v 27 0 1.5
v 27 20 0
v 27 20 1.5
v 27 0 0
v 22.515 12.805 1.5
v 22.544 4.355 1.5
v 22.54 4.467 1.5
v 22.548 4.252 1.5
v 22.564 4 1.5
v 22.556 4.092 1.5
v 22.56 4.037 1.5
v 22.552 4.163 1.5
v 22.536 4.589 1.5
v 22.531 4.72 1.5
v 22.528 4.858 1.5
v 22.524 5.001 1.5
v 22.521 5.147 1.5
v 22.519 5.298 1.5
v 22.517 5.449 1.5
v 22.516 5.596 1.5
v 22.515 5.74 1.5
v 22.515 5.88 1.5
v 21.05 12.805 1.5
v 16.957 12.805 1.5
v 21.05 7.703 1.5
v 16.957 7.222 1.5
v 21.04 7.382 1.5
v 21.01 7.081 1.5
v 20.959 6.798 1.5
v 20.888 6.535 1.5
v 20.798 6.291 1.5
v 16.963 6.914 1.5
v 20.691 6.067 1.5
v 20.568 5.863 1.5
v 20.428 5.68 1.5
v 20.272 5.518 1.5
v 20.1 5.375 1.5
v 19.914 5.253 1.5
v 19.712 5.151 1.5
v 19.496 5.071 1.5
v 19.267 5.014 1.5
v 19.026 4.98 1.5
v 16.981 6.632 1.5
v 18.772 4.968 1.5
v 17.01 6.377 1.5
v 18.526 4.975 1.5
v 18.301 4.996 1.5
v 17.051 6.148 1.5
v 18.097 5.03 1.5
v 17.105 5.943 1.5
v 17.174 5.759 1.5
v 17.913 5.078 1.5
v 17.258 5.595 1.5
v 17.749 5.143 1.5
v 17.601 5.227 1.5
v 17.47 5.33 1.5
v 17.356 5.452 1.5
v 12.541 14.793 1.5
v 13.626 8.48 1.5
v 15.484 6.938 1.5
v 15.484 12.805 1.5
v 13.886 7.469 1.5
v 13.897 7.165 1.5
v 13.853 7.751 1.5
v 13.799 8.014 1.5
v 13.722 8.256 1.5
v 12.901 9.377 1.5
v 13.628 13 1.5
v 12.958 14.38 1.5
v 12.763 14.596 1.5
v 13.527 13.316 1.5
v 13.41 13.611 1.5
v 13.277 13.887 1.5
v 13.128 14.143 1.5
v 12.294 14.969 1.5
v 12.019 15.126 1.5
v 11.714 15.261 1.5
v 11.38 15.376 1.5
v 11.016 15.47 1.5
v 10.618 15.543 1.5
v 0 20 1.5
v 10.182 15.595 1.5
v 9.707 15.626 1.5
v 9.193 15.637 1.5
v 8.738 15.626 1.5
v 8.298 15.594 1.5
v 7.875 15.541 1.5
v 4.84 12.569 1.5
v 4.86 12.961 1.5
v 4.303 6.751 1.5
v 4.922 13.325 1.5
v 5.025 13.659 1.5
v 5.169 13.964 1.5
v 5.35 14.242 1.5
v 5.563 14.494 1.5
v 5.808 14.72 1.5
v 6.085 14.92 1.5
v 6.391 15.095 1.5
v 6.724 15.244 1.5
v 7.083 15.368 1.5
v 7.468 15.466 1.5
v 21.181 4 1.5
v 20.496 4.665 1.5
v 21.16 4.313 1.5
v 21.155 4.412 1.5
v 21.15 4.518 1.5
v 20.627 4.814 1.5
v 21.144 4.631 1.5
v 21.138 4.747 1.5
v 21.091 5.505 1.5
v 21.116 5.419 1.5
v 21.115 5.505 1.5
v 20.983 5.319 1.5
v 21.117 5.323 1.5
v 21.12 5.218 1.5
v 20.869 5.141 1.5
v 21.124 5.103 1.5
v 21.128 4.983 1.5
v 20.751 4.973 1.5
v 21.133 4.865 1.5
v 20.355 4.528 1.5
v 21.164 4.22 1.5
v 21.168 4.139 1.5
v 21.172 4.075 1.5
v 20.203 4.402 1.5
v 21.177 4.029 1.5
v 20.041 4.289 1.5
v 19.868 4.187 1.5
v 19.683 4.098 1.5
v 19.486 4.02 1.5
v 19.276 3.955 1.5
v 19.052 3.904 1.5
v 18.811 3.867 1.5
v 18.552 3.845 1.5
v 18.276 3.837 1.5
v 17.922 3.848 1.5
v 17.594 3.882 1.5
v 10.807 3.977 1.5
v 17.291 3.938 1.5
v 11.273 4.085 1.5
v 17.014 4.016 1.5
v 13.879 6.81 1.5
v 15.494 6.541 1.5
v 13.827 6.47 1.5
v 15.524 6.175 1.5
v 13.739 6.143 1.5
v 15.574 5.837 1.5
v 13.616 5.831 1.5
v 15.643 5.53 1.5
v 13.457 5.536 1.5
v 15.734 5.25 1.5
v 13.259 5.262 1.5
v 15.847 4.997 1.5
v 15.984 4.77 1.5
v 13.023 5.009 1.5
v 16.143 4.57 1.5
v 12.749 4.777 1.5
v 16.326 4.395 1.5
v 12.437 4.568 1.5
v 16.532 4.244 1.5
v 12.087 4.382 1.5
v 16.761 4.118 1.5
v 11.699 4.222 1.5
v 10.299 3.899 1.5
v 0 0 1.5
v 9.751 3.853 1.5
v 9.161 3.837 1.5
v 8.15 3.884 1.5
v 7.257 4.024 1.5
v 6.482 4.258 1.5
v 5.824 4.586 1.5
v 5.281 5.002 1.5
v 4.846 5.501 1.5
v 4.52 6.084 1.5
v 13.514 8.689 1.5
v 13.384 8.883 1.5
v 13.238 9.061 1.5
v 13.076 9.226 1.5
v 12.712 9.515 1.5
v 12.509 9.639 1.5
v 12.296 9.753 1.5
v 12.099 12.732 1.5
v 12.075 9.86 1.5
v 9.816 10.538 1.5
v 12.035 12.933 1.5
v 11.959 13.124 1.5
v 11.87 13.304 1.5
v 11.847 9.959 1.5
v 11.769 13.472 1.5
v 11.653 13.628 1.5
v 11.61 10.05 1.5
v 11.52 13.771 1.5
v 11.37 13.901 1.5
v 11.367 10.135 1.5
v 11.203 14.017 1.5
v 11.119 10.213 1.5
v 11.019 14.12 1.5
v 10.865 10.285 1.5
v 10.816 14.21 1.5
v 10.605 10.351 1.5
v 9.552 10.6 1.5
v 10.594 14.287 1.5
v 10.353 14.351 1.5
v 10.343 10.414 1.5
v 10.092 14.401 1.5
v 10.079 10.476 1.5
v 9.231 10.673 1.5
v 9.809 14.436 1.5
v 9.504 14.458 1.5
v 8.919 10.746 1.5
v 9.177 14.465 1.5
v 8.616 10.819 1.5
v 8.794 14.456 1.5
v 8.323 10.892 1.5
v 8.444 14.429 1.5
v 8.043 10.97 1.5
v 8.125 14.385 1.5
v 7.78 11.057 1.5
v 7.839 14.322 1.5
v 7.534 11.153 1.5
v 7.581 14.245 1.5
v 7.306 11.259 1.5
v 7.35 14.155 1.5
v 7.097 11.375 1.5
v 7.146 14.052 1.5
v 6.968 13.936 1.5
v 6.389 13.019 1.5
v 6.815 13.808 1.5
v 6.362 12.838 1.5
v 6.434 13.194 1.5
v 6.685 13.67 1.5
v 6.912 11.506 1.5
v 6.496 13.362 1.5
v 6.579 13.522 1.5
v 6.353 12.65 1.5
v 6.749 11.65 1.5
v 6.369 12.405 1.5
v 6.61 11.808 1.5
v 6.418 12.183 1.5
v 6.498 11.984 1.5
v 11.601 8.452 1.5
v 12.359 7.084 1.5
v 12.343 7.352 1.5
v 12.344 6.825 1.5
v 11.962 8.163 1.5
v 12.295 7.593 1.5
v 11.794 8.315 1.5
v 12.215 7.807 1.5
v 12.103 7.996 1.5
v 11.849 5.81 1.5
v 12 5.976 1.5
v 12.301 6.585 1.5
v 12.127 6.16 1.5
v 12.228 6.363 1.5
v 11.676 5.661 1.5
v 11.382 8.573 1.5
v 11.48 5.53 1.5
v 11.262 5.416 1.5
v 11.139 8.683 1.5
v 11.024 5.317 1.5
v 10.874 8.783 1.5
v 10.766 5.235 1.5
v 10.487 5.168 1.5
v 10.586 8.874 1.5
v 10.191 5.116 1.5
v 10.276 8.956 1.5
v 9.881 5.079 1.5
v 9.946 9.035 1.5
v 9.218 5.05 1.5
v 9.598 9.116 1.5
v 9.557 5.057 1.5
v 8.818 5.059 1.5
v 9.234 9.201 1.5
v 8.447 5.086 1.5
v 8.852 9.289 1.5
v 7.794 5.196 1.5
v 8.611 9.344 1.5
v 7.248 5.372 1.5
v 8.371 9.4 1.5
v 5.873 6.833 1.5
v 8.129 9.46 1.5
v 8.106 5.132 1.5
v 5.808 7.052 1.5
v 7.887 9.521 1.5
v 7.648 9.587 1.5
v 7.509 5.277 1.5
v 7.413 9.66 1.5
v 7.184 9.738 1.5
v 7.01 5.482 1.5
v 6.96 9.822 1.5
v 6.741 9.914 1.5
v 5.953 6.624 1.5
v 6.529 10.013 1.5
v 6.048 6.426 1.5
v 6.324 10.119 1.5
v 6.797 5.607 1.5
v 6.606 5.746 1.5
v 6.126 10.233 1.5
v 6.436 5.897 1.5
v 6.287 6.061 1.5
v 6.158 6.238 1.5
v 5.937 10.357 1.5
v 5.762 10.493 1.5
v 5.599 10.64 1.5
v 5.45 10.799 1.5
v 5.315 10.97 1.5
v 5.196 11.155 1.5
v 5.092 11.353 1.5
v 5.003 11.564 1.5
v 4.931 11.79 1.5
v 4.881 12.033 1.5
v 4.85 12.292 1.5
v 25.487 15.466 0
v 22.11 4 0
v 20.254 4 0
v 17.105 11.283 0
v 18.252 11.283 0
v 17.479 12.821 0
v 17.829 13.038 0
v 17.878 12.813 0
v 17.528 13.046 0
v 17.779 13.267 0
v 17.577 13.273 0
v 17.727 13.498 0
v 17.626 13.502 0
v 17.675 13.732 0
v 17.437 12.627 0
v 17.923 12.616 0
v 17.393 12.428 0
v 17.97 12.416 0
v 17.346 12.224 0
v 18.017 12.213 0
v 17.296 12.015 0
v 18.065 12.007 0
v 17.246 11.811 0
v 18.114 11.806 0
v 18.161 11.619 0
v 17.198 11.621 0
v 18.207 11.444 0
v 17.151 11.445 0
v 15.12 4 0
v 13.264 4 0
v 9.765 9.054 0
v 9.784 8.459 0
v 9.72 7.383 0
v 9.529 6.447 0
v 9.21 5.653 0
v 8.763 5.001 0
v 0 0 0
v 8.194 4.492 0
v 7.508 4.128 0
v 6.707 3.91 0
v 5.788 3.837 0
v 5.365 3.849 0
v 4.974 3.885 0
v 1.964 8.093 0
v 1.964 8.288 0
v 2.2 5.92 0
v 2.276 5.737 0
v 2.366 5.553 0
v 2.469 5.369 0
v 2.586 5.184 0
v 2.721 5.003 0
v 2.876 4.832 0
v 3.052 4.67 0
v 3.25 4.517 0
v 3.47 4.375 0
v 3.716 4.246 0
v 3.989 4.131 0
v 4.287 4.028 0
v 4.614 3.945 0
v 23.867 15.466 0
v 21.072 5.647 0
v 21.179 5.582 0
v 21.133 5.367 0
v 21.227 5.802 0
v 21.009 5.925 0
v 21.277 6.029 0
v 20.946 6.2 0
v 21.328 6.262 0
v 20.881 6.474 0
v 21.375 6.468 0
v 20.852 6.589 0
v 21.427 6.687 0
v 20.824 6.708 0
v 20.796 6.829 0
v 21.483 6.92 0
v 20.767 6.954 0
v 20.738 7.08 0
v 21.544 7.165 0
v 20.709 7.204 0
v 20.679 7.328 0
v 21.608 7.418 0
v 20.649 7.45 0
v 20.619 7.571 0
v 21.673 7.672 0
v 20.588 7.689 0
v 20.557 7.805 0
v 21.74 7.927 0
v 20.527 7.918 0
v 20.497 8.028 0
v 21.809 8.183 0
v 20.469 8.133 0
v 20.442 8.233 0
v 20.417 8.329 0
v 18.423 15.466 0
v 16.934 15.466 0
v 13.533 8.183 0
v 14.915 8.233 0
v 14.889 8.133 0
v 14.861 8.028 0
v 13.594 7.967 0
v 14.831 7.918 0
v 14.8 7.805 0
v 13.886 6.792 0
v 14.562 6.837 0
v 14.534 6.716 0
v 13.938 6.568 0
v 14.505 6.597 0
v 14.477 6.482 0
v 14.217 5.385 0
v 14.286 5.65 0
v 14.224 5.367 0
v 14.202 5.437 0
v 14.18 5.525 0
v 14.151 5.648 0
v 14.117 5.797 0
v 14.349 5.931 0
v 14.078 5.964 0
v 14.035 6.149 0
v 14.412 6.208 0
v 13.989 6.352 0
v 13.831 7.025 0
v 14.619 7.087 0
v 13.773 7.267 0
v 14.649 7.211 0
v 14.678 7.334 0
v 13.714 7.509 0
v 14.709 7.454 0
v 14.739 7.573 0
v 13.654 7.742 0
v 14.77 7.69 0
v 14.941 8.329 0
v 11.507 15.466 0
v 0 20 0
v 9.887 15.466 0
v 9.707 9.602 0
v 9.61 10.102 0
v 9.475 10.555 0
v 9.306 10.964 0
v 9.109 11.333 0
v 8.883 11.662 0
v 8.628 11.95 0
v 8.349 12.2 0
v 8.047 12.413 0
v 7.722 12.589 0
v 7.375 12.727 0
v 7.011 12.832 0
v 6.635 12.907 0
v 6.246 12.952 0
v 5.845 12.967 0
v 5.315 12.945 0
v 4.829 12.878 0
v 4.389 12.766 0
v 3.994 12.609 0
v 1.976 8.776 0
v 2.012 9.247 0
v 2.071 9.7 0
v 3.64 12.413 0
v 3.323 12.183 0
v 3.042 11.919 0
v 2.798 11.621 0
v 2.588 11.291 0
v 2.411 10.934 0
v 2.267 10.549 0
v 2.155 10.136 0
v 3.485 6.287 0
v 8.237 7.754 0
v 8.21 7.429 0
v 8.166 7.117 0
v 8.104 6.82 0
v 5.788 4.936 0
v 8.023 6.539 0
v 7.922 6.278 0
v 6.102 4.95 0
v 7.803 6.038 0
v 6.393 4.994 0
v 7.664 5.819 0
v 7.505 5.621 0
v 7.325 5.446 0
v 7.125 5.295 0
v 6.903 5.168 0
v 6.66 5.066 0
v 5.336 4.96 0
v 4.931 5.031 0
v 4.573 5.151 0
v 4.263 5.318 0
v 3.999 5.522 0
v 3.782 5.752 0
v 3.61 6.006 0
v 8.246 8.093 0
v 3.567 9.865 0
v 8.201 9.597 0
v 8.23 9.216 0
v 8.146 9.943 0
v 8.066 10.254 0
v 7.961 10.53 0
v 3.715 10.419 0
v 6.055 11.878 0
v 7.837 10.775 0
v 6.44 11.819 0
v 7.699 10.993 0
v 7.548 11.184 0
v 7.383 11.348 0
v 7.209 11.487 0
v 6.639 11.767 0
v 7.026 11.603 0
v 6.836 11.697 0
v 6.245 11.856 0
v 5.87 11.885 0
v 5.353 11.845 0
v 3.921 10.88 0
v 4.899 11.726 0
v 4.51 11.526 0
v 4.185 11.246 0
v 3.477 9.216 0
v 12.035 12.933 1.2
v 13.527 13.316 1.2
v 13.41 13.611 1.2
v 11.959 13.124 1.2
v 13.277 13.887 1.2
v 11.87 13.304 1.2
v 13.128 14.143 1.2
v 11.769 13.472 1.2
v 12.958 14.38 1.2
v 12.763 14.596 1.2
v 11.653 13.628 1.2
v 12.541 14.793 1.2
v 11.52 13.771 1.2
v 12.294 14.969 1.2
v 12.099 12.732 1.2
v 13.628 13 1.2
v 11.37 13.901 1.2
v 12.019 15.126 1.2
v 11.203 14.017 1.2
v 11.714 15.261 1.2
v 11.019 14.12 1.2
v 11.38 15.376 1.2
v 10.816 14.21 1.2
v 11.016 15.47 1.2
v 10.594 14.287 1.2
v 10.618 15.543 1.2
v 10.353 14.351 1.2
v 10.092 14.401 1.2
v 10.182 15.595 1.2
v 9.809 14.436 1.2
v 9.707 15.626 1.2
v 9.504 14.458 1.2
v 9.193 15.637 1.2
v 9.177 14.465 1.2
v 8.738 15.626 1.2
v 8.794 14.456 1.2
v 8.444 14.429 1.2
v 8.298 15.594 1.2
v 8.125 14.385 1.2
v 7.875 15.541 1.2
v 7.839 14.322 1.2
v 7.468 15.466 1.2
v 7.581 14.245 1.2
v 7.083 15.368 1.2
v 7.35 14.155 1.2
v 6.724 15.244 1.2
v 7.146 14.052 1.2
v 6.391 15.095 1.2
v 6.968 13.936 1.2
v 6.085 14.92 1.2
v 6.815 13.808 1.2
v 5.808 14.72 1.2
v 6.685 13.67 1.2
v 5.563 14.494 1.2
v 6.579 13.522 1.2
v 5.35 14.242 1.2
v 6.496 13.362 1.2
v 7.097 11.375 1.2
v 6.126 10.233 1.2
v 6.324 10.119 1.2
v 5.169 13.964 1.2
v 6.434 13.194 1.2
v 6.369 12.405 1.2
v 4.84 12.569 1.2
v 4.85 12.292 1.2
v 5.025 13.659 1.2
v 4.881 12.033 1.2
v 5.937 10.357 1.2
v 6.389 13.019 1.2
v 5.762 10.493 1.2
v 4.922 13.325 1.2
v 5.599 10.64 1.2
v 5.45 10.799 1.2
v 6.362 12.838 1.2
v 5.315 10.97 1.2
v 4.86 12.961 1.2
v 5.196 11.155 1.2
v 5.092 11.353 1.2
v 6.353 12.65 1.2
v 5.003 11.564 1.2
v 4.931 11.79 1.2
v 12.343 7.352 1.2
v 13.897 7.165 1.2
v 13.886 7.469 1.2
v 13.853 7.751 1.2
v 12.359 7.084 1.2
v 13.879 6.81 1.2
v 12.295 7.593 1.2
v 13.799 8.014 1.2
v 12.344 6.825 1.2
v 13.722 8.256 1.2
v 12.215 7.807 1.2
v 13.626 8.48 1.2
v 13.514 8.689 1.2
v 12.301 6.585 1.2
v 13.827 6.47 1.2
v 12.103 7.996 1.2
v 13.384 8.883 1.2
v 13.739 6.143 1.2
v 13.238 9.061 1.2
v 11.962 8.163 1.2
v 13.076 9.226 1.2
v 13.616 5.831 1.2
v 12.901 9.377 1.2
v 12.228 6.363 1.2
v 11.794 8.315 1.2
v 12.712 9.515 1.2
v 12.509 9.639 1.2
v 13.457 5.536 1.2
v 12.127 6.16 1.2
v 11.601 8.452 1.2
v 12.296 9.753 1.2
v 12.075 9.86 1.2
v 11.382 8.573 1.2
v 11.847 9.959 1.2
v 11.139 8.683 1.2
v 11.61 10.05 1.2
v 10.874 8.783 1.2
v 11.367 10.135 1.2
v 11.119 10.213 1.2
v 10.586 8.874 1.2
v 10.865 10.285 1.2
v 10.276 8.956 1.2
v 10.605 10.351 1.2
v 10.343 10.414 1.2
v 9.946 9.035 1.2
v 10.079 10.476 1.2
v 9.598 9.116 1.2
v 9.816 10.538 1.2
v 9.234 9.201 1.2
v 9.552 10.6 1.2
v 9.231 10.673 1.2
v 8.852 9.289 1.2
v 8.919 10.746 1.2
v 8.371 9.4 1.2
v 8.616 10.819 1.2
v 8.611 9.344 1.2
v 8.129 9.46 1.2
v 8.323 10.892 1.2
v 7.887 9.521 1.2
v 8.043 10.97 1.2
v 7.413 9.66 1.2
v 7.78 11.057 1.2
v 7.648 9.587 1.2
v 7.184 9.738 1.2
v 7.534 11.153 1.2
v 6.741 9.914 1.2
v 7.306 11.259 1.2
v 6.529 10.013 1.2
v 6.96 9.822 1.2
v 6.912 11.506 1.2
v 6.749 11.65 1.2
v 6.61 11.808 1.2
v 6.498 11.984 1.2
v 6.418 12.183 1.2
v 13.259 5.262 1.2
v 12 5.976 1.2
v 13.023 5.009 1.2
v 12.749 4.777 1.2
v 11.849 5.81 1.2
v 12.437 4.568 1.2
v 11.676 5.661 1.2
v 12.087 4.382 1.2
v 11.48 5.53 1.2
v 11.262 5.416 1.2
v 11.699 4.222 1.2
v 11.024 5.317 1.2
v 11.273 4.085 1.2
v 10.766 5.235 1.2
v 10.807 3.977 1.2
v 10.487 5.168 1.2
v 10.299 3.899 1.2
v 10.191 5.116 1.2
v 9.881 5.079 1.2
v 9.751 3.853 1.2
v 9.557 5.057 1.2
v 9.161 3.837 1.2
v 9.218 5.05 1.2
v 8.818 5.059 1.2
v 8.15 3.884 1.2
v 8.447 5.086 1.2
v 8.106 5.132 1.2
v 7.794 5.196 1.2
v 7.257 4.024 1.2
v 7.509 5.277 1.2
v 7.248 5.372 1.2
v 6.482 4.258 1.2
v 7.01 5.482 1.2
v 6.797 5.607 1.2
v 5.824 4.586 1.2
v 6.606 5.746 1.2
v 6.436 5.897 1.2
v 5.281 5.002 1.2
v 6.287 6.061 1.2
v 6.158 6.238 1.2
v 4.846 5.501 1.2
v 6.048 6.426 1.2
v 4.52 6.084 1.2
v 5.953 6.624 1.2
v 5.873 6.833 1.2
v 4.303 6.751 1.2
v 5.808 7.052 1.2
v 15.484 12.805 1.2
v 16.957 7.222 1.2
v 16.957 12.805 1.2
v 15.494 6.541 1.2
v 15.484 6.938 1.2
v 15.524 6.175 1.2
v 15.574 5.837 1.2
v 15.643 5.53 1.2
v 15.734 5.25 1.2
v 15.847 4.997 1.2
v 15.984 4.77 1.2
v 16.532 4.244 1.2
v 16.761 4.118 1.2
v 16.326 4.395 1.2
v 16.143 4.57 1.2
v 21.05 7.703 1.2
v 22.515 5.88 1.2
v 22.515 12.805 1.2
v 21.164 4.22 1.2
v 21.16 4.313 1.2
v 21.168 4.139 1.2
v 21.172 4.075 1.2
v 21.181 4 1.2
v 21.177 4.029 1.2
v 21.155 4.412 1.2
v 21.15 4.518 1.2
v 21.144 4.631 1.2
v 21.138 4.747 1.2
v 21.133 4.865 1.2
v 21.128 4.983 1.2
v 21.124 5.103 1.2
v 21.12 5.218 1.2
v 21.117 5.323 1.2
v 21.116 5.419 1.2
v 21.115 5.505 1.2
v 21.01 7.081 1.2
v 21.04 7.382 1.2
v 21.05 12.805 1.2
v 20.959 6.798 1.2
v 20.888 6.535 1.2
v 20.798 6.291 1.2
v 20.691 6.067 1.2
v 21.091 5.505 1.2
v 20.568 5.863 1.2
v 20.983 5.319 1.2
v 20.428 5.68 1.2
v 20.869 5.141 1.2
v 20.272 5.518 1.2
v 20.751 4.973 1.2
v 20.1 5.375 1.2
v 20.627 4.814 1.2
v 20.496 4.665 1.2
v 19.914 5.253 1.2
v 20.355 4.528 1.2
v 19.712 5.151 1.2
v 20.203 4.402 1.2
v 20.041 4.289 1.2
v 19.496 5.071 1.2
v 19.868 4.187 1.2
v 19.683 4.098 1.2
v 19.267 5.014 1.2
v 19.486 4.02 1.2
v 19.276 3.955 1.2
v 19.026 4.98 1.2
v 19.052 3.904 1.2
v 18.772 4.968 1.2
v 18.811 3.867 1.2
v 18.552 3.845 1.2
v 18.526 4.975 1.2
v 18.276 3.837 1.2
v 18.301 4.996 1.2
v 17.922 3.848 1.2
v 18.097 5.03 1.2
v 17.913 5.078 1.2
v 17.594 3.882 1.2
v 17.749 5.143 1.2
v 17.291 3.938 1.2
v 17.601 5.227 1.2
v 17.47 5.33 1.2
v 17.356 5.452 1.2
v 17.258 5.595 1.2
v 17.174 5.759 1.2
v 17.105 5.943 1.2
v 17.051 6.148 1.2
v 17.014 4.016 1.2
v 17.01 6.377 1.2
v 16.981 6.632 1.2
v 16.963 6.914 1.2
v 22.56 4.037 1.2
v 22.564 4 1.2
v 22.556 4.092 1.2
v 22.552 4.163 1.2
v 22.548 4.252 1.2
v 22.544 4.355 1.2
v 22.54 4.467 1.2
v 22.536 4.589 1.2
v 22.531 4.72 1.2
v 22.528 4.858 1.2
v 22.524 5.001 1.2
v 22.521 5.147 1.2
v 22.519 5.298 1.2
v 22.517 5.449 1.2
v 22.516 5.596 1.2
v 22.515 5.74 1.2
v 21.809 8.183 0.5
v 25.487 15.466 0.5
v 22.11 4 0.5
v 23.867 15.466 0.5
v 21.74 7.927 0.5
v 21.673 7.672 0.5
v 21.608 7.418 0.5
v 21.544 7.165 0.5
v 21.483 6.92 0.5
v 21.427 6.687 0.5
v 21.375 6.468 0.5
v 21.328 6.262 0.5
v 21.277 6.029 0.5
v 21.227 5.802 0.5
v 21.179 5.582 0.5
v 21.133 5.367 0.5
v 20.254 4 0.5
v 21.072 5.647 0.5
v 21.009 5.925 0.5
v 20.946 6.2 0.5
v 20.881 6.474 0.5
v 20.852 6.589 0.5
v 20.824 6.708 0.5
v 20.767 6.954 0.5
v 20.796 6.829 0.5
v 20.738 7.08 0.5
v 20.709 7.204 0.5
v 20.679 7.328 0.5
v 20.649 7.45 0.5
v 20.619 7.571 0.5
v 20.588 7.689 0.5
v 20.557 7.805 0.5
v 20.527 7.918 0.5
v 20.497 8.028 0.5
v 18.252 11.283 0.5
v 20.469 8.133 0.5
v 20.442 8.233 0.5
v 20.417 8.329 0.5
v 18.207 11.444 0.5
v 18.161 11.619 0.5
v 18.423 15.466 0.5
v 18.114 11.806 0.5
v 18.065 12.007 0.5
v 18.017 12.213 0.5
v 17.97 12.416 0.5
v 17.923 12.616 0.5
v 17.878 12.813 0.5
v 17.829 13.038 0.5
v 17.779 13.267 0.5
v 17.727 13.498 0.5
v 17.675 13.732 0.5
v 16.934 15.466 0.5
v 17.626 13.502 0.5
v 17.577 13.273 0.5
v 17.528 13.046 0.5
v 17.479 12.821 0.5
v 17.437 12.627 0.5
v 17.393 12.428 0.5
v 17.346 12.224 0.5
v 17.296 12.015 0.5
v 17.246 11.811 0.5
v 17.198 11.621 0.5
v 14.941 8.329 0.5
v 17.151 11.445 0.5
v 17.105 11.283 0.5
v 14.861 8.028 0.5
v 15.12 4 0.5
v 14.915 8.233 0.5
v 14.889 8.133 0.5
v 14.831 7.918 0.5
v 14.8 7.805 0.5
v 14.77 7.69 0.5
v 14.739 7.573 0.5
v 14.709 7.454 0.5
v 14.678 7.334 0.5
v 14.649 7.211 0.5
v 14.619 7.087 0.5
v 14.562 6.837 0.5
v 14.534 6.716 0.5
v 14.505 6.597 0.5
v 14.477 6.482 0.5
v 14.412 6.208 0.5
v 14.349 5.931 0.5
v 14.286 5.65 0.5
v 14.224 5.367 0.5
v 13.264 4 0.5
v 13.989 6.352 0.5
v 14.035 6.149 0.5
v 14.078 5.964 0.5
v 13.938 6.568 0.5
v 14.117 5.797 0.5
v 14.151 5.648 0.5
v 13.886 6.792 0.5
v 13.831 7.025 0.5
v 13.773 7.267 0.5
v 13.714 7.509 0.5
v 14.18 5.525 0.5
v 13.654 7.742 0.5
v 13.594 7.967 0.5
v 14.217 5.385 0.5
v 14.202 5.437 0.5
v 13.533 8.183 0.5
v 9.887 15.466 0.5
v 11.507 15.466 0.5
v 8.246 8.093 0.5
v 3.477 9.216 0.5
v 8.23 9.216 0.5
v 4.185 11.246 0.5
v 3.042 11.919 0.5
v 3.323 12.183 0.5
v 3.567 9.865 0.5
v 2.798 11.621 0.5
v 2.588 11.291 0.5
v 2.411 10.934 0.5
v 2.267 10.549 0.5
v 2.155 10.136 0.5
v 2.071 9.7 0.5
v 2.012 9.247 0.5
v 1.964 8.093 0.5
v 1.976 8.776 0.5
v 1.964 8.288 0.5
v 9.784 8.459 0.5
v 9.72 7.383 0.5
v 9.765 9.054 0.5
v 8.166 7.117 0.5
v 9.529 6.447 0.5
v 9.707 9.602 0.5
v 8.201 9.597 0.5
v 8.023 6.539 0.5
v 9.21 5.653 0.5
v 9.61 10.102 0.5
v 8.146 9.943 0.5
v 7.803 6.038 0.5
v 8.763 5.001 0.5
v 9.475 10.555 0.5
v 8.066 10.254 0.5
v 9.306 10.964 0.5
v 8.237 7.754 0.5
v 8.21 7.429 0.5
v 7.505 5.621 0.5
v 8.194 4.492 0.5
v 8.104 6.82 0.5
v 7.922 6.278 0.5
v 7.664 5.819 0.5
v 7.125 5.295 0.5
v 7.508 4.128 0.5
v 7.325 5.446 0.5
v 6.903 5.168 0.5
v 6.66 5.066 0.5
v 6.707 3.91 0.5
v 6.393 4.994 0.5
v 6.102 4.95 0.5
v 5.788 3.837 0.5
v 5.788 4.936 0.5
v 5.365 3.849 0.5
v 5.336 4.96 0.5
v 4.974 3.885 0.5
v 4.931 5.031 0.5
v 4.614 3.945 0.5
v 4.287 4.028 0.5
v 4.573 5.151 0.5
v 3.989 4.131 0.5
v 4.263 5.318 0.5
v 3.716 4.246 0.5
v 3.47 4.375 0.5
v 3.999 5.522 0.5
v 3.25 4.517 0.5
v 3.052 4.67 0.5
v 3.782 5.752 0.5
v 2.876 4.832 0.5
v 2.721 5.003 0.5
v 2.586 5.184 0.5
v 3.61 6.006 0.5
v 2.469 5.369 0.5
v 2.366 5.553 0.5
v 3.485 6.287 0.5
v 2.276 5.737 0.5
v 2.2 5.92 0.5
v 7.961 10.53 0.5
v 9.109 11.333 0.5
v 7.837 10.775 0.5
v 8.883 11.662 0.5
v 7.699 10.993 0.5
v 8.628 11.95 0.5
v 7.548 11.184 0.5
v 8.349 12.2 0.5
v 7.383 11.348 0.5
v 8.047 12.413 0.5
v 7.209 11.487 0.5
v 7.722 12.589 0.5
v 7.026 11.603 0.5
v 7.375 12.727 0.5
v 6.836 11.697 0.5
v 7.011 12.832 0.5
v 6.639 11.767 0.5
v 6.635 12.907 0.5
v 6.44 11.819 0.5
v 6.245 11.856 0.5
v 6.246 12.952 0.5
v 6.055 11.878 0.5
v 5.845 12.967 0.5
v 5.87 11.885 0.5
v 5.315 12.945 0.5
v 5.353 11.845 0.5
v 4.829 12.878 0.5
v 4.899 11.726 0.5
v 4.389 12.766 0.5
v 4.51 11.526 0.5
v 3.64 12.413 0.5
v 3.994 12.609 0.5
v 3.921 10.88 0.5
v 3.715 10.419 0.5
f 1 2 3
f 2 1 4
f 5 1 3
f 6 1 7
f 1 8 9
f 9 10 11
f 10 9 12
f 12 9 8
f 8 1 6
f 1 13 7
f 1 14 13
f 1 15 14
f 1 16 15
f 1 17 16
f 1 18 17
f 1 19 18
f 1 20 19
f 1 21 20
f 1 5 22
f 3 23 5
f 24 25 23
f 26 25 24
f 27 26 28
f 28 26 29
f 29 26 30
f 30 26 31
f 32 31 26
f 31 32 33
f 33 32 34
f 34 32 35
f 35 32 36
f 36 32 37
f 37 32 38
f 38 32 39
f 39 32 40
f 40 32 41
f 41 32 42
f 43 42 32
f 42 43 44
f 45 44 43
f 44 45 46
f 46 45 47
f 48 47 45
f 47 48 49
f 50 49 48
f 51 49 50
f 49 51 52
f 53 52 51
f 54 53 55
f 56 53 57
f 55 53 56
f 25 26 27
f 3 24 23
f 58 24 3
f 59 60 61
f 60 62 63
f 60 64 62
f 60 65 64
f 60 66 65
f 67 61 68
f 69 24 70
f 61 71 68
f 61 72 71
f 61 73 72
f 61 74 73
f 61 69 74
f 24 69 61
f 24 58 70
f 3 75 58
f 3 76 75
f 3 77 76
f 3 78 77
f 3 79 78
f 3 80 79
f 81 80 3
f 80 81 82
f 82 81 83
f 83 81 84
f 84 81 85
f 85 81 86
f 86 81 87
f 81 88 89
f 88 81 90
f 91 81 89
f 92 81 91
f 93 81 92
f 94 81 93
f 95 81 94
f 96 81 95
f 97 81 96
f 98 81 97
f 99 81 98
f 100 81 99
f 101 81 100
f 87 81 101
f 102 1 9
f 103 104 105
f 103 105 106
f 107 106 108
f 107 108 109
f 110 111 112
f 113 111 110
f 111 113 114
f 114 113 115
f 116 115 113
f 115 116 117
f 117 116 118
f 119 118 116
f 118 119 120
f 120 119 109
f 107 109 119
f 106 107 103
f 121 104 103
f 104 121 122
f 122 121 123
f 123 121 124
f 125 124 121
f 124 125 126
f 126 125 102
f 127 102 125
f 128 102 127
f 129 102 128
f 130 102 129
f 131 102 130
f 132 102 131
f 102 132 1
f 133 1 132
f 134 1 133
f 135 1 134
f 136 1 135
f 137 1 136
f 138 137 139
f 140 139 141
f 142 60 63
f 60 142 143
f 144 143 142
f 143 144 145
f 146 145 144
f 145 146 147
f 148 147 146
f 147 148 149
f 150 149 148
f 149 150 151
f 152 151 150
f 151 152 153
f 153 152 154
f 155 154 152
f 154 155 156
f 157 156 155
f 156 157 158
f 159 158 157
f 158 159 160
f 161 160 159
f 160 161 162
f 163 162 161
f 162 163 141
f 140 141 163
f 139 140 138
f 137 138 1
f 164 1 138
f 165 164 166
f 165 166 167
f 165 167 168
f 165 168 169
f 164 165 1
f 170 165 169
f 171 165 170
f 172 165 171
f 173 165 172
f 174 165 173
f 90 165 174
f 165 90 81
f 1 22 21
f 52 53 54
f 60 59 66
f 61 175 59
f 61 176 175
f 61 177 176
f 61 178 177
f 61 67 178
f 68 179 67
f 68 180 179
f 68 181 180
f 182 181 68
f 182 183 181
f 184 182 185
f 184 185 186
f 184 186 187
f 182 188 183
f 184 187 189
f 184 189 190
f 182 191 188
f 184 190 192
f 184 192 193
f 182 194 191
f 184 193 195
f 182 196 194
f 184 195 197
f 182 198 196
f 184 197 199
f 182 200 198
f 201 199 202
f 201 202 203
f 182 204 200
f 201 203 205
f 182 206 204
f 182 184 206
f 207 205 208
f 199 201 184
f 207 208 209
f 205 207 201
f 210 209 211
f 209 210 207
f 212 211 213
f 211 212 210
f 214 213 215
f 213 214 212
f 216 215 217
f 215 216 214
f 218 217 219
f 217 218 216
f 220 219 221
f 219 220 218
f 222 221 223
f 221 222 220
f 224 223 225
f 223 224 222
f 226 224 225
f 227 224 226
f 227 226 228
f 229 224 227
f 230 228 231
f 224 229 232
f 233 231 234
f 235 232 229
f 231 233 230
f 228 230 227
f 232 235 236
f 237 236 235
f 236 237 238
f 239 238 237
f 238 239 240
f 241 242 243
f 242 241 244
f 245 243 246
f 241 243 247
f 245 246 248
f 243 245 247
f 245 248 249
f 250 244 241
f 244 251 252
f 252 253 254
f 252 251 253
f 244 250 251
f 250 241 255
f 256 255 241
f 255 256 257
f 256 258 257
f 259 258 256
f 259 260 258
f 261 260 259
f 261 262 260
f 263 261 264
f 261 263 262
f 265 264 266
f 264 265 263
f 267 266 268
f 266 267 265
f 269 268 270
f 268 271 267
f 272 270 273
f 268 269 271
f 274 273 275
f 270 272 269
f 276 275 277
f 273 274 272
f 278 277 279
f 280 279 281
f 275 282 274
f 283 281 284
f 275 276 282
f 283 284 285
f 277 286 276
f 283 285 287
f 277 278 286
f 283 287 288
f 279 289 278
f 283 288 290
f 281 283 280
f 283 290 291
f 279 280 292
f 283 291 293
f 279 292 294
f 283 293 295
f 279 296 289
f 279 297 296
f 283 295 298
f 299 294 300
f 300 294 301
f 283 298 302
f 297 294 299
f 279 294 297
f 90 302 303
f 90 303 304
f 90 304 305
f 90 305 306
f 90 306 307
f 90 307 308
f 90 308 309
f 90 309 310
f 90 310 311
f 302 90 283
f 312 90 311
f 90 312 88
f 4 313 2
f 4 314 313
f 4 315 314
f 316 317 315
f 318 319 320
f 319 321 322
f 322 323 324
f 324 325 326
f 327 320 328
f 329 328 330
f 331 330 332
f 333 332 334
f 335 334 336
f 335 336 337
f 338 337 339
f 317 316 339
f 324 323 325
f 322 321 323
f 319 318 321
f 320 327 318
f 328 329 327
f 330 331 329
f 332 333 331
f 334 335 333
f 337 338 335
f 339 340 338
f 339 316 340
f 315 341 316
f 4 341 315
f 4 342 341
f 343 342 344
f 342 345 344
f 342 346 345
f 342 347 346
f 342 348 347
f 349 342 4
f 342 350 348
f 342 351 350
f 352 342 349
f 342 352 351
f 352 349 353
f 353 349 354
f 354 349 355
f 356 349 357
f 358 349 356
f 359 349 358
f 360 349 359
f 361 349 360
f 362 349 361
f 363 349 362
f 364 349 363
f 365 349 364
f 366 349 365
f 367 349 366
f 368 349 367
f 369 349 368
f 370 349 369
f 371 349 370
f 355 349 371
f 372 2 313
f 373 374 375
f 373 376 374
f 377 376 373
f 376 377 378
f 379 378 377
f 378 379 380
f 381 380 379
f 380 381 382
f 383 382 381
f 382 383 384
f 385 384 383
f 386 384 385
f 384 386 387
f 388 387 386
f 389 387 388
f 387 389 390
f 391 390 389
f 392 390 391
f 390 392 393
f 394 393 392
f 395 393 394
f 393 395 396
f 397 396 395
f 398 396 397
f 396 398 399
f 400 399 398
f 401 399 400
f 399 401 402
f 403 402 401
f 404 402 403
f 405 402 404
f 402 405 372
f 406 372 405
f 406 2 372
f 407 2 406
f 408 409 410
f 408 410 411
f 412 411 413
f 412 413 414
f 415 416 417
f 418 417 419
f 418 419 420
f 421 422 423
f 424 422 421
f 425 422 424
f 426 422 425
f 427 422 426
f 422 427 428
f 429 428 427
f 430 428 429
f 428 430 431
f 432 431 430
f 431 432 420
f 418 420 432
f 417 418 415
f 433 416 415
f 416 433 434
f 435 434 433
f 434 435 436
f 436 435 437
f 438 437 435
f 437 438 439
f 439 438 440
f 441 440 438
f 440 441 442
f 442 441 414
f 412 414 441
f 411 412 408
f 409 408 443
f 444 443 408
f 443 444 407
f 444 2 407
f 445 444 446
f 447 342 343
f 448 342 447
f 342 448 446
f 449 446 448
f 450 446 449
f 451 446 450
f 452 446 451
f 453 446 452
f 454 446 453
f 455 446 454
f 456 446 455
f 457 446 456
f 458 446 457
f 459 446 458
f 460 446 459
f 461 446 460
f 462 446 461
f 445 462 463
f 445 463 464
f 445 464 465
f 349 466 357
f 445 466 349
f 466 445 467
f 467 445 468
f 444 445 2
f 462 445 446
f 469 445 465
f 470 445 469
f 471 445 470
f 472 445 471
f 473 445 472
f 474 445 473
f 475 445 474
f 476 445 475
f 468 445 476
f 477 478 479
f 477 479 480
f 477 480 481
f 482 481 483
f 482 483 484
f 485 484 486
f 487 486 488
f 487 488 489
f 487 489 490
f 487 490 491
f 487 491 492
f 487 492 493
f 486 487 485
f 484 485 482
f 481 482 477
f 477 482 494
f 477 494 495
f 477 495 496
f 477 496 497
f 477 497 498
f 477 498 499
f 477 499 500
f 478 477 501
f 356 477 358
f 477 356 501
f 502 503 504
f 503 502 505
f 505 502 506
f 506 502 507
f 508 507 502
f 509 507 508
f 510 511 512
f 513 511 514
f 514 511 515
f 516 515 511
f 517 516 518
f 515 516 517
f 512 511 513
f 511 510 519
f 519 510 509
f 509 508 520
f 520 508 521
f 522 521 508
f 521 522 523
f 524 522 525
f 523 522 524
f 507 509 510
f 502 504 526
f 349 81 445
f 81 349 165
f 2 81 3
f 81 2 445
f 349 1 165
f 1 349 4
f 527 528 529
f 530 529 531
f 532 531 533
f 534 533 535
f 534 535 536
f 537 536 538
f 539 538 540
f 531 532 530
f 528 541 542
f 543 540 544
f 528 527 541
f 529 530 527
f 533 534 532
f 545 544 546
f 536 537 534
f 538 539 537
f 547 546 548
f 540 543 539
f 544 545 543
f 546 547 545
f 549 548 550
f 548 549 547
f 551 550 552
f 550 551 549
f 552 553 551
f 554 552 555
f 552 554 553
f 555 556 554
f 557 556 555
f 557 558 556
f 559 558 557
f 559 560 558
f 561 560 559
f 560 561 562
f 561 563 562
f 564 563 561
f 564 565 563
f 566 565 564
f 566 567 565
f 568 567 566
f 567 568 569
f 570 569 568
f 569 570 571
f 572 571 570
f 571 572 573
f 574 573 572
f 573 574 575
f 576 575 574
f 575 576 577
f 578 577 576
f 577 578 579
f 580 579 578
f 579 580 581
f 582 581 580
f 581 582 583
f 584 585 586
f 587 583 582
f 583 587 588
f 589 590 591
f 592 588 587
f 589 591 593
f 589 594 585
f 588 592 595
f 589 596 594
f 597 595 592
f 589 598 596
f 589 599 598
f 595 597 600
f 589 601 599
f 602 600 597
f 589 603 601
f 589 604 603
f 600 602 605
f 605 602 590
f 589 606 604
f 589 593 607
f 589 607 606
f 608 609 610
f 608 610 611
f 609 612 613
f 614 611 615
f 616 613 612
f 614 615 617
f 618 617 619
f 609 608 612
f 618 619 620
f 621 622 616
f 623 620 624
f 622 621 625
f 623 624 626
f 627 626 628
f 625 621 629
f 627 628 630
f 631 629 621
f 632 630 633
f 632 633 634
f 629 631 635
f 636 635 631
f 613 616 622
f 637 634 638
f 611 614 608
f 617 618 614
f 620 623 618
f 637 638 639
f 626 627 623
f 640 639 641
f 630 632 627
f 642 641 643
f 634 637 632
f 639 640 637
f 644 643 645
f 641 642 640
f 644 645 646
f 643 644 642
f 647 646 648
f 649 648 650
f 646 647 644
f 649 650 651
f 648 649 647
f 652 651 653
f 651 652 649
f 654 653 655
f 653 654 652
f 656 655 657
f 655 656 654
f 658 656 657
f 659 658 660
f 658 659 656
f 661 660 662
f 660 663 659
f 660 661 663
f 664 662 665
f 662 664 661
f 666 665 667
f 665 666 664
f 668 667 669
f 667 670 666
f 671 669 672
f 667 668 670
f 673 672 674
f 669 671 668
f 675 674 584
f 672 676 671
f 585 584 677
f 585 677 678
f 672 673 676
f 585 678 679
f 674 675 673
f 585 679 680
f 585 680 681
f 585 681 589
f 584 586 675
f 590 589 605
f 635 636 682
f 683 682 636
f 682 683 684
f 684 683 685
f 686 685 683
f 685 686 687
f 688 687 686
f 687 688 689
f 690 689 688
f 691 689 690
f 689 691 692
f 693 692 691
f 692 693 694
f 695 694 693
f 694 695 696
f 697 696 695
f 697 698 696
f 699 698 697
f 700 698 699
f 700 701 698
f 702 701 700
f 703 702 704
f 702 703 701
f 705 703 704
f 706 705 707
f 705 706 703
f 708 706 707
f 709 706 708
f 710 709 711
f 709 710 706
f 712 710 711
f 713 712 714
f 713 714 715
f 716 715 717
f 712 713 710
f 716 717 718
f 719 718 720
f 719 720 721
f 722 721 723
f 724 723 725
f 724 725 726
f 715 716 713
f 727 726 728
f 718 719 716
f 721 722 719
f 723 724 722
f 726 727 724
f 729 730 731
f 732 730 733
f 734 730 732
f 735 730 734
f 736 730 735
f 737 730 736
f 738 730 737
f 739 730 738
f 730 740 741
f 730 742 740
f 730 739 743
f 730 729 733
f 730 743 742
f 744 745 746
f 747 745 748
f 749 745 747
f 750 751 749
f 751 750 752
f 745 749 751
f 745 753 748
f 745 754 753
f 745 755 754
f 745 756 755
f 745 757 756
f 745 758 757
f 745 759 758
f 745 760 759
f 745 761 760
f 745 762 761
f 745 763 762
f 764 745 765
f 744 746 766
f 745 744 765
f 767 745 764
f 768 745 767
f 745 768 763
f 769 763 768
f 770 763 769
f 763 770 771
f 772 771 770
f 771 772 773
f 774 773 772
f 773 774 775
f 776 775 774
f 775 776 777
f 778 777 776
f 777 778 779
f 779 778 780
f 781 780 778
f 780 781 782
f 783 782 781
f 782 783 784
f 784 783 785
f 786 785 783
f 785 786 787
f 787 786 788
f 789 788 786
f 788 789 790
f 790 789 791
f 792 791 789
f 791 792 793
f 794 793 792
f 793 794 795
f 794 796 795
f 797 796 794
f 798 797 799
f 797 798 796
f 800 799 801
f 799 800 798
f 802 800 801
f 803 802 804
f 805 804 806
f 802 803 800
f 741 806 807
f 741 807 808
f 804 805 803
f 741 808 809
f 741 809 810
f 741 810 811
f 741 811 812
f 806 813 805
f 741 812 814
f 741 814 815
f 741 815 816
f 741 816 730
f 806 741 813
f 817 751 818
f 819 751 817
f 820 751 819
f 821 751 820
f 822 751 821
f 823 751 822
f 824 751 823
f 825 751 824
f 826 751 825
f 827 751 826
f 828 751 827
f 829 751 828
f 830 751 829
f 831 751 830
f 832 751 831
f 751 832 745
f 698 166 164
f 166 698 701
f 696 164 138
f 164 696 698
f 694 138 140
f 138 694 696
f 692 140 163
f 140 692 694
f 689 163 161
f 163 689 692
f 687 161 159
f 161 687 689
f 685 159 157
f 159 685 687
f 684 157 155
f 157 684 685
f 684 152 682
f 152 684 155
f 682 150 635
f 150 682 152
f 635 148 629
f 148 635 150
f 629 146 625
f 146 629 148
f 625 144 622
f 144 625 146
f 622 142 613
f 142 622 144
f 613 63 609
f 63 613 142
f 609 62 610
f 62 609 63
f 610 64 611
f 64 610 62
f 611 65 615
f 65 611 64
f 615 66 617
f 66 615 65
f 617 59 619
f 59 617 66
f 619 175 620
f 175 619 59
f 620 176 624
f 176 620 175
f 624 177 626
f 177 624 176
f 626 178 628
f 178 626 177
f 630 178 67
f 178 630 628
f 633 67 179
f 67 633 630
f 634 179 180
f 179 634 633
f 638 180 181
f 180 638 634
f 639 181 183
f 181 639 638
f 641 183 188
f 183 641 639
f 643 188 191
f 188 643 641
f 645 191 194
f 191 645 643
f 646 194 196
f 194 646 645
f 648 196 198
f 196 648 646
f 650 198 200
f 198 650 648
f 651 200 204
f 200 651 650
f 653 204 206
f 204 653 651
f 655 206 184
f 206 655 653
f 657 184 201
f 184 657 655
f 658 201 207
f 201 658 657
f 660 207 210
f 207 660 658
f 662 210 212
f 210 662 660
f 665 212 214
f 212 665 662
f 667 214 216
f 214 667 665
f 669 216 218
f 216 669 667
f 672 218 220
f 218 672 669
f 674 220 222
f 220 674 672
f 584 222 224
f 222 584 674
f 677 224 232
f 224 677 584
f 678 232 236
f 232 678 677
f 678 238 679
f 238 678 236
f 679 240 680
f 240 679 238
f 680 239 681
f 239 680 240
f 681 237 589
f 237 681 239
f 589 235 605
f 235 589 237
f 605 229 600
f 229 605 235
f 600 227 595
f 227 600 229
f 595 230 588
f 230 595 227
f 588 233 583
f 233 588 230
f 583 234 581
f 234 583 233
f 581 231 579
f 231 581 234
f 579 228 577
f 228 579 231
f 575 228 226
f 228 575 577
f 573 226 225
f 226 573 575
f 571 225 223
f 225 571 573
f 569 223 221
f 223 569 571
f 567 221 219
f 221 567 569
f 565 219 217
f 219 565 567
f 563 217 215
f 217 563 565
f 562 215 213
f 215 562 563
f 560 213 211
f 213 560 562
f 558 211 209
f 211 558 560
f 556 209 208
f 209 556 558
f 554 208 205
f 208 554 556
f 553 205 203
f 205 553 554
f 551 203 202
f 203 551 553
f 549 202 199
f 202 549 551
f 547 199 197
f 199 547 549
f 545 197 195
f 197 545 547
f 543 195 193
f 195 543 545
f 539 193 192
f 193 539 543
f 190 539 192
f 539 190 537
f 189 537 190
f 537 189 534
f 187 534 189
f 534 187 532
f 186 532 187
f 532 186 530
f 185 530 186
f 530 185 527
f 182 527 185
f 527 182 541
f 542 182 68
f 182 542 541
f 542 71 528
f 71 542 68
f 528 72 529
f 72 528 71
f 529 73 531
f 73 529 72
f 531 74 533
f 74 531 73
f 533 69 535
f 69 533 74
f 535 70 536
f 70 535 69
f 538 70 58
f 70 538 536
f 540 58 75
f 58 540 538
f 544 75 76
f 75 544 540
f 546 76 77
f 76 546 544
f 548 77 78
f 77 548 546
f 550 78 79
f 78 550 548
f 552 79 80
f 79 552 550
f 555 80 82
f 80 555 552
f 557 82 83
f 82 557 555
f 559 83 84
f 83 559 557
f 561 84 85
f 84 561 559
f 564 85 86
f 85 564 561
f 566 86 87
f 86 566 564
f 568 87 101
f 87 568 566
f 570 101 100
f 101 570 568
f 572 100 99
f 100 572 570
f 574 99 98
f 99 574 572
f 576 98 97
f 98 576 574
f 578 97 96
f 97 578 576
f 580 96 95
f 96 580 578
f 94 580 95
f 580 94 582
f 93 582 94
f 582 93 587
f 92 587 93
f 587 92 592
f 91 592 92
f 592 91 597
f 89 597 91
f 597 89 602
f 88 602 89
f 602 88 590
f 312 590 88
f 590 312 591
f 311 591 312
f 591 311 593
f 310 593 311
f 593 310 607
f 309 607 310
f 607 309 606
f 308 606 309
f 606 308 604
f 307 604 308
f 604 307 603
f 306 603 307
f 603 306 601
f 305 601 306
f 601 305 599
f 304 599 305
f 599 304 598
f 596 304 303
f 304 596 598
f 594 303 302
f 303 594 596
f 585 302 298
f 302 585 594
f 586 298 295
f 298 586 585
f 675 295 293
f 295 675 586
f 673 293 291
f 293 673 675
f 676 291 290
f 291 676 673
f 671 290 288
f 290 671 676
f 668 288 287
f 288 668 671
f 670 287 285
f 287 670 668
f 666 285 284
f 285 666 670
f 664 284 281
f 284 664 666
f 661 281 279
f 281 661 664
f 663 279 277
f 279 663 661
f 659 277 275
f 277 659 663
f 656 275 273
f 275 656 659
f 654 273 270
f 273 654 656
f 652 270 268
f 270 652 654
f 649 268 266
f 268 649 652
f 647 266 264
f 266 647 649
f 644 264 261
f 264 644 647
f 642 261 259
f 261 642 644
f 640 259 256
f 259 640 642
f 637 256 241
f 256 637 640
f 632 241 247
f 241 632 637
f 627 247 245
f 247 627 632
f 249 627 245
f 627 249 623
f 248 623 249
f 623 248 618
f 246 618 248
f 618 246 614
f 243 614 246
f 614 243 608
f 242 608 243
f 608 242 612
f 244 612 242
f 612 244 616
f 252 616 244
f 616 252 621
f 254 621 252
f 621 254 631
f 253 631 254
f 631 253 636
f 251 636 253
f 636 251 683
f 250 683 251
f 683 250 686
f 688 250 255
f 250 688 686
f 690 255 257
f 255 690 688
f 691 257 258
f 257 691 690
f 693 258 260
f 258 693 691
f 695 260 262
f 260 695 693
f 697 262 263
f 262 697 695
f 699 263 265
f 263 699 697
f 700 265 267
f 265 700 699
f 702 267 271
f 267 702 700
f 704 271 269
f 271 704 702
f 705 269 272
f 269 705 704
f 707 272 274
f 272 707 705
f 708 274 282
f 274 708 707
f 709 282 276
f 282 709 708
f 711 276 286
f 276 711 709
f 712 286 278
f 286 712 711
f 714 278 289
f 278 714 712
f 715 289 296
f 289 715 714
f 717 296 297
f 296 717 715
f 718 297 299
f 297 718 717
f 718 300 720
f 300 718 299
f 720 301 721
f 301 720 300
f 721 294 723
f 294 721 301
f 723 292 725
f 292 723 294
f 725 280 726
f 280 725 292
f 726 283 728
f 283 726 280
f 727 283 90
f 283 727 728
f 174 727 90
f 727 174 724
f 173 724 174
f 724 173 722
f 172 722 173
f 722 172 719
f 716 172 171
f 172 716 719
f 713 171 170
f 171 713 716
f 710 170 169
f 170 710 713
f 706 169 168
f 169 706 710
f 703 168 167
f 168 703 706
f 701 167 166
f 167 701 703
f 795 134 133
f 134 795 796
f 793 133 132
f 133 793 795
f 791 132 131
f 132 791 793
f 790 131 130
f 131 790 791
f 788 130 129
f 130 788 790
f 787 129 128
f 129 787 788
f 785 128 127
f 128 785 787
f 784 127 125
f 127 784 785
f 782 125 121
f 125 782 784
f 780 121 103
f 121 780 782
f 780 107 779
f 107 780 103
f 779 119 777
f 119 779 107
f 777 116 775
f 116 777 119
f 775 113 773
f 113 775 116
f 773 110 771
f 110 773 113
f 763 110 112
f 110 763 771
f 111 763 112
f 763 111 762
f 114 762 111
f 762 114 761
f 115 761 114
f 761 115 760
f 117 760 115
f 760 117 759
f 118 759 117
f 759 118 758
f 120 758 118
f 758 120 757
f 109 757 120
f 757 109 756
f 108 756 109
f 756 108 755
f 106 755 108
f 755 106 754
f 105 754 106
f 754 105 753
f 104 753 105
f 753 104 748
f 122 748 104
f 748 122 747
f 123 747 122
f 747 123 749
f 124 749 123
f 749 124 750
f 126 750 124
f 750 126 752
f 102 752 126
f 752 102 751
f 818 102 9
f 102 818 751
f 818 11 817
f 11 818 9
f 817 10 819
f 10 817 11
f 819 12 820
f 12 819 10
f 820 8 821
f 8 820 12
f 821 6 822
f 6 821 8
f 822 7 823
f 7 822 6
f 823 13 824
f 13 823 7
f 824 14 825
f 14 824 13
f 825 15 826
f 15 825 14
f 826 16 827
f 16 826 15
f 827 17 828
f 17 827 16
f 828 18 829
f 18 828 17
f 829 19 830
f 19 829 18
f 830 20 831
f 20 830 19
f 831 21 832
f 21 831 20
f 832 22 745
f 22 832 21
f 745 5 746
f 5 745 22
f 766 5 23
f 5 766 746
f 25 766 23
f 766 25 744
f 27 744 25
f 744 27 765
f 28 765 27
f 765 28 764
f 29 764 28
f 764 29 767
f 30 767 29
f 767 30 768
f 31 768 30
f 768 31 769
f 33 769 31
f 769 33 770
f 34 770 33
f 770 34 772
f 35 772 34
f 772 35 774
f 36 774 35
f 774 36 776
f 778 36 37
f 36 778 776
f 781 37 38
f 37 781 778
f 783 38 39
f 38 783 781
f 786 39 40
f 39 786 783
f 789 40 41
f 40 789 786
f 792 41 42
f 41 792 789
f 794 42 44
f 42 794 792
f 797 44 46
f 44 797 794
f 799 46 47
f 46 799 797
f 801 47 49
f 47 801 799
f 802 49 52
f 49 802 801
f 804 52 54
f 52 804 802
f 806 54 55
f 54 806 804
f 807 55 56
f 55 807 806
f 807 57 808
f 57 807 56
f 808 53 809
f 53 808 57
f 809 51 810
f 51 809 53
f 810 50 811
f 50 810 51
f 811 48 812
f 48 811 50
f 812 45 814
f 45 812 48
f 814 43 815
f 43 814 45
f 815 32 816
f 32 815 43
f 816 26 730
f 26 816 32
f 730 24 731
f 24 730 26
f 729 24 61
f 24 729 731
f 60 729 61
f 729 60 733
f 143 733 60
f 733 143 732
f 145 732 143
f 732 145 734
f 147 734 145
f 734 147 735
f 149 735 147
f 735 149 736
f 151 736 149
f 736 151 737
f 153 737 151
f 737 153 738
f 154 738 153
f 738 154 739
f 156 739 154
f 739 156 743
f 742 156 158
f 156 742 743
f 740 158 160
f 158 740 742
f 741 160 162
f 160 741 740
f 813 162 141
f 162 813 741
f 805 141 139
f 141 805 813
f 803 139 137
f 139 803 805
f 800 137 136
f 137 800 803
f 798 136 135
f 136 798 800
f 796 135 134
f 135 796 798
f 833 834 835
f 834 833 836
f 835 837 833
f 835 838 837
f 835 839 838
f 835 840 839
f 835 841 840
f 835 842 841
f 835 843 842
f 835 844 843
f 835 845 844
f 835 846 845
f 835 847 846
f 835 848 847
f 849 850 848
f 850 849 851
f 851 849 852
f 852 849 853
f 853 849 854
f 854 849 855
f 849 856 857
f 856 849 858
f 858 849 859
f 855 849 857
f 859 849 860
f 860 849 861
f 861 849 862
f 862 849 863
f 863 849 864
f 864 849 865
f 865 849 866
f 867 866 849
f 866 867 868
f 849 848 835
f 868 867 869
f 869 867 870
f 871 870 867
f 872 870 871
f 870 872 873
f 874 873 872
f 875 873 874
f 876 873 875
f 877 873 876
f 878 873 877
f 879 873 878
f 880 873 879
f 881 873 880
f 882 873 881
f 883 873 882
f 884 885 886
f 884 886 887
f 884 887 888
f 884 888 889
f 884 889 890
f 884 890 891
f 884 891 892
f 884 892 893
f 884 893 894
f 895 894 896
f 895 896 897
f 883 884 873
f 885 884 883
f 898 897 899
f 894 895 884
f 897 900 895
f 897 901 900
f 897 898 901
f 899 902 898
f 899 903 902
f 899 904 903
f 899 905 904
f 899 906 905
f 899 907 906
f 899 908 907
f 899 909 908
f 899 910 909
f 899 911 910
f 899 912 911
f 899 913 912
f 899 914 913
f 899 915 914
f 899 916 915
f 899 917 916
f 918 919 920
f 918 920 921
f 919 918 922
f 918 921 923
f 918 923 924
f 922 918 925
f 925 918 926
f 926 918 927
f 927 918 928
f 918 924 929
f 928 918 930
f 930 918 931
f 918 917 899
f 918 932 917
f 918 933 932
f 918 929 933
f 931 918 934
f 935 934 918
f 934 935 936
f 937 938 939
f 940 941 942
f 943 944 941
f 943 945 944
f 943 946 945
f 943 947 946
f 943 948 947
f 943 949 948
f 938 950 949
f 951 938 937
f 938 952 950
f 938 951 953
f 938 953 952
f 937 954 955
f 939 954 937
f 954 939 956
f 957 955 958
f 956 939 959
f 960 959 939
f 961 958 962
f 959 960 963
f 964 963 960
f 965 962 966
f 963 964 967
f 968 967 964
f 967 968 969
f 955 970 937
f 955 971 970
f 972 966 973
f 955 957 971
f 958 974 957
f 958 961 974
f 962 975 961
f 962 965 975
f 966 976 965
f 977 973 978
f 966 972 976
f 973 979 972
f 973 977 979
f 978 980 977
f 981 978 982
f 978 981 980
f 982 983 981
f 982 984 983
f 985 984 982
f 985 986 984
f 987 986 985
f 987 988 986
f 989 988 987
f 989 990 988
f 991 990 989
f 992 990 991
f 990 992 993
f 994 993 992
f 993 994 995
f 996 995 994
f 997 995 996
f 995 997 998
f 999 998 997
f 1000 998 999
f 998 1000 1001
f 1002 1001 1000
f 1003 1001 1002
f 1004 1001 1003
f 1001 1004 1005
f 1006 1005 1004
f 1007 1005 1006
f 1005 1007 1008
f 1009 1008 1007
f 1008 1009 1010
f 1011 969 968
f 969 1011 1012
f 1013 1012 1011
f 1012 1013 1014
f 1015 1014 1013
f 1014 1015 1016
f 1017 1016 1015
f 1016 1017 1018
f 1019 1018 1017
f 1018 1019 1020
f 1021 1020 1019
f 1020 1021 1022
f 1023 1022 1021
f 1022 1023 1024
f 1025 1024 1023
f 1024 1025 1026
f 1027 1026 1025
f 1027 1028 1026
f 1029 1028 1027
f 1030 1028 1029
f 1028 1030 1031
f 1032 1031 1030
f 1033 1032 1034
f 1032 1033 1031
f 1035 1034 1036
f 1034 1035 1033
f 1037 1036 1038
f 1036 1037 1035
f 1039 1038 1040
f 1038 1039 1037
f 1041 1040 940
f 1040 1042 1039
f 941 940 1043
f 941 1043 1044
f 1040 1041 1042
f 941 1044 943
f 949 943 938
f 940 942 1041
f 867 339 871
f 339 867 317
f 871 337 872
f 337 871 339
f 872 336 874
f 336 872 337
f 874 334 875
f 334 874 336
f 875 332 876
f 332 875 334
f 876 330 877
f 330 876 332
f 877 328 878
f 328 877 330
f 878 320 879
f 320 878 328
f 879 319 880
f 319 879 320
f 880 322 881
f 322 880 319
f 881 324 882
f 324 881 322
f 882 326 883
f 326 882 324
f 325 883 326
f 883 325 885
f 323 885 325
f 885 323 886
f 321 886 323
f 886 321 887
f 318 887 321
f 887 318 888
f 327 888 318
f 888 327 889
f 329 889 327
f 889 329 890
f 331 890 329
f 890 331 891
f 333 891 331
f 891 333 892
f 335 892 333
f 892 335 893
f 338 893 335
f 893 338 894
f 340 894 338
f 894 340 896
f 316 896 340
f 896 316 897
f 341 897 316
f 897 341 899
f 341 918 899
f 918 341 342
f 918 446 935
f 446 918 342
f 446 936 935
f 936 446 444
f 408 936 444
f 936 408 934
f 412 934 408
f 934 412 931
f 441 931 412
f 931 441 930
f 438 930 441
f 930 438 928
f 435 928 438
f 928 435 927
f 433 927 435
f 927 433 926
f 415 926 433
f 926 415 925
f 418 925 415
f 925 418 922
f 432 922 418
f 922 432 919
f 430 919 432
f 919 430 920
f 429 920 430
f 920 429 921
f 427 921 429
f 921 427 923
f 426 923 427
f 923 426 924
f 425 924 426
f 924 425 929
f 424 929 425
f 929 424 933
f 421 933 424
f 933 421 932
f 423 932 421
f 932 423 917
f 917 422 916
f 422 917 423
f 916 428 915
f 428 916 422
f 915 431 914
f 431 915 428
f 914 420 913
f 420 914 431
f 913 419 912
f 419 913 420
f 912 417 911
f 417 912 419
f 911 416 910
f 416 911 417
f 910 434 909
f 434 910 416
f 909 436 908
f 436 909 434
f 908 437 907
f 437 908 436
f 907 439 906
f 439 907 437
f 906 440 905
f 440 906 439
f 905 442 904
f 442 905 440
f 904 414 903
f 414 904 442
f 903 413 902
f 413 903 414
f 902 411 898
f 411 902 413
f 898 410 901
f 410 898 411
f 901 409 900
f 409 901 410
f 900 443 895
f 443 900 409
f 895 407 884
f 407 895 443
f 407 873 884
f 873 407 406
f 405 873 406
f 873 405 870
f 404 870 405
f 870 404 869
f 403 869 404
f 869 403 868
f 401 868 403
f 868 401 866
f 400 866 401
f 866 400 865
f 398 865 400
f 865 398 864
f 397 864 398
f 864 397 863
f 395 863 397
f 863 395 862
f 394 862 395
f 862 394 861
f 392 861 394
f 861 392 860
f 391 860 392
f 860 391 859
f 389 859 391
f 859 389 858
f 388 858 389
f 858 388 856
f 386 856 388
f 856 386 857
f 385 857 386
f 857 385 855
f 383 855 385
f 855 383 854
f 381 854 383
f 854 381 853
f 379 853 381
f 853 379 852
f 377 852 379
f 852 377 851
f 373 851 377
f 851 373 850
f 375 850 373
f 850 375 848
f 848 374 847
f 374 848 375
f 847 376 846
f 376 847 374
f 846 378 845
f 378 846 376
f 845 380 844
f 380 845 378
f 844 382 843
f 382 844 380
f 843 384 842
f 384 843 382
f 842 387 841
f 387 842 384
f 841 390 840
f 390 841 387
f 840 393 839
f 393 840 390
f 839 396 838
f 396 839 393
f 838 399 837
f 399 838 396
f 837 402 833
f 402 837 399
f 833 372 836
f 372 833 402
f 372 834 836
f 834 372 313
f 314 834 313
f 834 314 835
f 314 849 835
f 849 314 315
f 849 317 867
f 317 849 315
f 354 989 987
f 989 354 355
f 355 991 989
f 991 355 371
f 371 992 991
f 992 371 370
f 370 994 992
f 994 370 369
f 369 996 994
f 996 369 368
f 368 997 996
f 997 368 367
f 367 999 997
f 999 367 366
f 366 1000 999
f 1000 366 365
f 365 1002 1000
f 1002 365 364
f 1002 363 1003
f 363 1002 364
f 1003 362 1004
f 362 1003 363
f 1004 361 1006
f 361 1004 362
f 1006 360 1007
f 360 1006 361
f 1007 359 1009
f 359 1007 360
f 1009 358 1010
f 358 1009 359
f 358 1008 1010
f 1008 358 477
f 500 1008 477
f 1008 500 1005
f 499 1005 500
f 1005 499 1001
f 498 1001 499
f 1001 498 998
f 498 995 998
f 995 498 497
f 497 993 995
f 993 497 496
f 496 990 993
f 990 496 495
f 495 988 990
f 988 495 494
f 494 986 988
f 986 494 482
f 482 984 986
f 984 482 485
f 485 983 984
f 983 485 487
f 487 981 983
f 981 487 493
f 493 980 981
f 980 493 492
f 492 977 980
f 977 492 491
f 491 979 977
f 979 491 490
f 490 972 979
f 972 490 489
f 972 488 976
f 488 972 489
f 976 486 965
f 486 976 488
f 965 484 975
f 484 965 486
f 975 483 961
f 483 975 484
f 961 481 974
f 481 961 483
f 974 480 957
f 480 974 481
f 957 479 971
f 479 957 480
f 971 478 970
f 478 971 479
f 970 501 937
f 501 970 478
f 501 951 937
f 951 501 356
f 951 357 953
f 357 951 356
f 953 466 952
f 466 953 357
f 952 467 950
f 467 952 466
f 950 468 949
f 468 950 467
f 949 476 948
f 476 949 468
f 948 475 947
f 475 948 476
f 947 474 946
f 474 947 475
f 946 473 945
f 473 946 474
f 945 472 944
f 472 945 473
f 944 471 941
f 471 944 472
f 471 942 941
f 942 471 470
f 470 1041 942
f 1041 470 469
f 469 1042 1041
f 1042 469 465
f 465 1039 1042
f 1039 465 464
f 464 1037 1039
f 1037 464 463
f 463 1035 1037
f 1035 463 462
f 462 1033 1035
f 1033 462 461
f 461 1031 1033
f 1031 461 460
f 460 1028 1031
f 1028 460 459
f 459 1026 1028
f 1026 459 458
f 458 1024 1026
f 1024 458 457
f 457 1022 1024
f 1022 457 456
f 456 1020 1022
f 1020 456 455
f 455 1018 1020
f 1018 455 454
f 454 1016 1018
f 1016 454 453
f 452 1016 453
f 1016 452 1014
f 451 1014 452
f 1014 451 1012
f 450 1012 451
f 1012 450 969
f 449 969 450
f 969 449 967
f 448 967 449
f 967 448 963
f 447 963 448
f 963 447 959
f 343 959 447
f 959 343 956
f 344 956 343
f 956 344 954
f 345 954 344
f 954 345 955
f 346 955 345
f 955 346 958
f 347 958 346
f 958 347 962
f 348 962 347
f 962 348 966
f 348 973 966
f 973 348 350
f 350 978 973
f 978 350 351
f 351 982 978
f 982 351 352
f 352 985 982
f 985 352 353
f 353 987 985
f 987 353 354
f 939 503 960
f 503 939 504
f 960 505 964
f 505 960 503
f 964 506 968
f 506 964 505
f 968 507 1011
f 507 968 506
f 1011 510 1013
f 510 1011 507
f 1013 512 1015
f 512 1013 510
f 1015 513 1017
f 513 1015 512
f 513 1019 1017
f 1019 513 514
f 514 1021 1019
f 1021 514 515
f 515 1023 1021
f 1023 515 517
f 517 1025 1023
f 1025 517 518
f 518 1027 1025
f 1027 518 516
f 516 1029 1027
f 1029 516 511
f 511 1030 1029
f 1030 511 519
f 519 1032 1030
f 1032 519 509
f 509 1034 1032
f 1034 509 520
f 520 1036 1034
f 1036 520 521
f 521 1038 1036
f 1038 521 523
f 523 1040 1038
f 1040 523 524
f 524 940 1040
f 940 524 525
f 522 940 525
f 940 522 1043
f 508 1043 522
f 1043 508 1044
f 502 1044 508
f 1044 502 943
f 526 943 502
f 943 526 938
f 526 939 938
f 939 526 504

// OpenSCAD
$fn=30;

//Masse (nicht zu knapp!):
//Mass, not too short
x=27; //Laenge
y=20; //Breite
z=1.5;  //Hoehe - 1.5 dürfte das Minimum sein
f="Arial";
s=12;  //Size
text1="Su";
text2="We";

difference() {
    //Aussenkoerper
    cube([x,y,z],false);
    translate([x/2,(y-s)/2,4*(z/5)]) {
        cube([1,1,0],false); //nur Ausrichtung
        linear_extrude(height = z) {
        text(text1,font=f,s,halign="center");
        }
    }
    //die Berechnung stimmt nicht so ganz... aber irgendwie passts schon
    translate([x/2,(y-s)/2,-(z/3)*2]) {
        cube([1,1,0],false); //nur Ausrichtung
        mirror([1, 0, 0]) {
            linear_extrude(height = z) {
                text(text2,font=f,s,halign="center");
            }
        }
    }
}
